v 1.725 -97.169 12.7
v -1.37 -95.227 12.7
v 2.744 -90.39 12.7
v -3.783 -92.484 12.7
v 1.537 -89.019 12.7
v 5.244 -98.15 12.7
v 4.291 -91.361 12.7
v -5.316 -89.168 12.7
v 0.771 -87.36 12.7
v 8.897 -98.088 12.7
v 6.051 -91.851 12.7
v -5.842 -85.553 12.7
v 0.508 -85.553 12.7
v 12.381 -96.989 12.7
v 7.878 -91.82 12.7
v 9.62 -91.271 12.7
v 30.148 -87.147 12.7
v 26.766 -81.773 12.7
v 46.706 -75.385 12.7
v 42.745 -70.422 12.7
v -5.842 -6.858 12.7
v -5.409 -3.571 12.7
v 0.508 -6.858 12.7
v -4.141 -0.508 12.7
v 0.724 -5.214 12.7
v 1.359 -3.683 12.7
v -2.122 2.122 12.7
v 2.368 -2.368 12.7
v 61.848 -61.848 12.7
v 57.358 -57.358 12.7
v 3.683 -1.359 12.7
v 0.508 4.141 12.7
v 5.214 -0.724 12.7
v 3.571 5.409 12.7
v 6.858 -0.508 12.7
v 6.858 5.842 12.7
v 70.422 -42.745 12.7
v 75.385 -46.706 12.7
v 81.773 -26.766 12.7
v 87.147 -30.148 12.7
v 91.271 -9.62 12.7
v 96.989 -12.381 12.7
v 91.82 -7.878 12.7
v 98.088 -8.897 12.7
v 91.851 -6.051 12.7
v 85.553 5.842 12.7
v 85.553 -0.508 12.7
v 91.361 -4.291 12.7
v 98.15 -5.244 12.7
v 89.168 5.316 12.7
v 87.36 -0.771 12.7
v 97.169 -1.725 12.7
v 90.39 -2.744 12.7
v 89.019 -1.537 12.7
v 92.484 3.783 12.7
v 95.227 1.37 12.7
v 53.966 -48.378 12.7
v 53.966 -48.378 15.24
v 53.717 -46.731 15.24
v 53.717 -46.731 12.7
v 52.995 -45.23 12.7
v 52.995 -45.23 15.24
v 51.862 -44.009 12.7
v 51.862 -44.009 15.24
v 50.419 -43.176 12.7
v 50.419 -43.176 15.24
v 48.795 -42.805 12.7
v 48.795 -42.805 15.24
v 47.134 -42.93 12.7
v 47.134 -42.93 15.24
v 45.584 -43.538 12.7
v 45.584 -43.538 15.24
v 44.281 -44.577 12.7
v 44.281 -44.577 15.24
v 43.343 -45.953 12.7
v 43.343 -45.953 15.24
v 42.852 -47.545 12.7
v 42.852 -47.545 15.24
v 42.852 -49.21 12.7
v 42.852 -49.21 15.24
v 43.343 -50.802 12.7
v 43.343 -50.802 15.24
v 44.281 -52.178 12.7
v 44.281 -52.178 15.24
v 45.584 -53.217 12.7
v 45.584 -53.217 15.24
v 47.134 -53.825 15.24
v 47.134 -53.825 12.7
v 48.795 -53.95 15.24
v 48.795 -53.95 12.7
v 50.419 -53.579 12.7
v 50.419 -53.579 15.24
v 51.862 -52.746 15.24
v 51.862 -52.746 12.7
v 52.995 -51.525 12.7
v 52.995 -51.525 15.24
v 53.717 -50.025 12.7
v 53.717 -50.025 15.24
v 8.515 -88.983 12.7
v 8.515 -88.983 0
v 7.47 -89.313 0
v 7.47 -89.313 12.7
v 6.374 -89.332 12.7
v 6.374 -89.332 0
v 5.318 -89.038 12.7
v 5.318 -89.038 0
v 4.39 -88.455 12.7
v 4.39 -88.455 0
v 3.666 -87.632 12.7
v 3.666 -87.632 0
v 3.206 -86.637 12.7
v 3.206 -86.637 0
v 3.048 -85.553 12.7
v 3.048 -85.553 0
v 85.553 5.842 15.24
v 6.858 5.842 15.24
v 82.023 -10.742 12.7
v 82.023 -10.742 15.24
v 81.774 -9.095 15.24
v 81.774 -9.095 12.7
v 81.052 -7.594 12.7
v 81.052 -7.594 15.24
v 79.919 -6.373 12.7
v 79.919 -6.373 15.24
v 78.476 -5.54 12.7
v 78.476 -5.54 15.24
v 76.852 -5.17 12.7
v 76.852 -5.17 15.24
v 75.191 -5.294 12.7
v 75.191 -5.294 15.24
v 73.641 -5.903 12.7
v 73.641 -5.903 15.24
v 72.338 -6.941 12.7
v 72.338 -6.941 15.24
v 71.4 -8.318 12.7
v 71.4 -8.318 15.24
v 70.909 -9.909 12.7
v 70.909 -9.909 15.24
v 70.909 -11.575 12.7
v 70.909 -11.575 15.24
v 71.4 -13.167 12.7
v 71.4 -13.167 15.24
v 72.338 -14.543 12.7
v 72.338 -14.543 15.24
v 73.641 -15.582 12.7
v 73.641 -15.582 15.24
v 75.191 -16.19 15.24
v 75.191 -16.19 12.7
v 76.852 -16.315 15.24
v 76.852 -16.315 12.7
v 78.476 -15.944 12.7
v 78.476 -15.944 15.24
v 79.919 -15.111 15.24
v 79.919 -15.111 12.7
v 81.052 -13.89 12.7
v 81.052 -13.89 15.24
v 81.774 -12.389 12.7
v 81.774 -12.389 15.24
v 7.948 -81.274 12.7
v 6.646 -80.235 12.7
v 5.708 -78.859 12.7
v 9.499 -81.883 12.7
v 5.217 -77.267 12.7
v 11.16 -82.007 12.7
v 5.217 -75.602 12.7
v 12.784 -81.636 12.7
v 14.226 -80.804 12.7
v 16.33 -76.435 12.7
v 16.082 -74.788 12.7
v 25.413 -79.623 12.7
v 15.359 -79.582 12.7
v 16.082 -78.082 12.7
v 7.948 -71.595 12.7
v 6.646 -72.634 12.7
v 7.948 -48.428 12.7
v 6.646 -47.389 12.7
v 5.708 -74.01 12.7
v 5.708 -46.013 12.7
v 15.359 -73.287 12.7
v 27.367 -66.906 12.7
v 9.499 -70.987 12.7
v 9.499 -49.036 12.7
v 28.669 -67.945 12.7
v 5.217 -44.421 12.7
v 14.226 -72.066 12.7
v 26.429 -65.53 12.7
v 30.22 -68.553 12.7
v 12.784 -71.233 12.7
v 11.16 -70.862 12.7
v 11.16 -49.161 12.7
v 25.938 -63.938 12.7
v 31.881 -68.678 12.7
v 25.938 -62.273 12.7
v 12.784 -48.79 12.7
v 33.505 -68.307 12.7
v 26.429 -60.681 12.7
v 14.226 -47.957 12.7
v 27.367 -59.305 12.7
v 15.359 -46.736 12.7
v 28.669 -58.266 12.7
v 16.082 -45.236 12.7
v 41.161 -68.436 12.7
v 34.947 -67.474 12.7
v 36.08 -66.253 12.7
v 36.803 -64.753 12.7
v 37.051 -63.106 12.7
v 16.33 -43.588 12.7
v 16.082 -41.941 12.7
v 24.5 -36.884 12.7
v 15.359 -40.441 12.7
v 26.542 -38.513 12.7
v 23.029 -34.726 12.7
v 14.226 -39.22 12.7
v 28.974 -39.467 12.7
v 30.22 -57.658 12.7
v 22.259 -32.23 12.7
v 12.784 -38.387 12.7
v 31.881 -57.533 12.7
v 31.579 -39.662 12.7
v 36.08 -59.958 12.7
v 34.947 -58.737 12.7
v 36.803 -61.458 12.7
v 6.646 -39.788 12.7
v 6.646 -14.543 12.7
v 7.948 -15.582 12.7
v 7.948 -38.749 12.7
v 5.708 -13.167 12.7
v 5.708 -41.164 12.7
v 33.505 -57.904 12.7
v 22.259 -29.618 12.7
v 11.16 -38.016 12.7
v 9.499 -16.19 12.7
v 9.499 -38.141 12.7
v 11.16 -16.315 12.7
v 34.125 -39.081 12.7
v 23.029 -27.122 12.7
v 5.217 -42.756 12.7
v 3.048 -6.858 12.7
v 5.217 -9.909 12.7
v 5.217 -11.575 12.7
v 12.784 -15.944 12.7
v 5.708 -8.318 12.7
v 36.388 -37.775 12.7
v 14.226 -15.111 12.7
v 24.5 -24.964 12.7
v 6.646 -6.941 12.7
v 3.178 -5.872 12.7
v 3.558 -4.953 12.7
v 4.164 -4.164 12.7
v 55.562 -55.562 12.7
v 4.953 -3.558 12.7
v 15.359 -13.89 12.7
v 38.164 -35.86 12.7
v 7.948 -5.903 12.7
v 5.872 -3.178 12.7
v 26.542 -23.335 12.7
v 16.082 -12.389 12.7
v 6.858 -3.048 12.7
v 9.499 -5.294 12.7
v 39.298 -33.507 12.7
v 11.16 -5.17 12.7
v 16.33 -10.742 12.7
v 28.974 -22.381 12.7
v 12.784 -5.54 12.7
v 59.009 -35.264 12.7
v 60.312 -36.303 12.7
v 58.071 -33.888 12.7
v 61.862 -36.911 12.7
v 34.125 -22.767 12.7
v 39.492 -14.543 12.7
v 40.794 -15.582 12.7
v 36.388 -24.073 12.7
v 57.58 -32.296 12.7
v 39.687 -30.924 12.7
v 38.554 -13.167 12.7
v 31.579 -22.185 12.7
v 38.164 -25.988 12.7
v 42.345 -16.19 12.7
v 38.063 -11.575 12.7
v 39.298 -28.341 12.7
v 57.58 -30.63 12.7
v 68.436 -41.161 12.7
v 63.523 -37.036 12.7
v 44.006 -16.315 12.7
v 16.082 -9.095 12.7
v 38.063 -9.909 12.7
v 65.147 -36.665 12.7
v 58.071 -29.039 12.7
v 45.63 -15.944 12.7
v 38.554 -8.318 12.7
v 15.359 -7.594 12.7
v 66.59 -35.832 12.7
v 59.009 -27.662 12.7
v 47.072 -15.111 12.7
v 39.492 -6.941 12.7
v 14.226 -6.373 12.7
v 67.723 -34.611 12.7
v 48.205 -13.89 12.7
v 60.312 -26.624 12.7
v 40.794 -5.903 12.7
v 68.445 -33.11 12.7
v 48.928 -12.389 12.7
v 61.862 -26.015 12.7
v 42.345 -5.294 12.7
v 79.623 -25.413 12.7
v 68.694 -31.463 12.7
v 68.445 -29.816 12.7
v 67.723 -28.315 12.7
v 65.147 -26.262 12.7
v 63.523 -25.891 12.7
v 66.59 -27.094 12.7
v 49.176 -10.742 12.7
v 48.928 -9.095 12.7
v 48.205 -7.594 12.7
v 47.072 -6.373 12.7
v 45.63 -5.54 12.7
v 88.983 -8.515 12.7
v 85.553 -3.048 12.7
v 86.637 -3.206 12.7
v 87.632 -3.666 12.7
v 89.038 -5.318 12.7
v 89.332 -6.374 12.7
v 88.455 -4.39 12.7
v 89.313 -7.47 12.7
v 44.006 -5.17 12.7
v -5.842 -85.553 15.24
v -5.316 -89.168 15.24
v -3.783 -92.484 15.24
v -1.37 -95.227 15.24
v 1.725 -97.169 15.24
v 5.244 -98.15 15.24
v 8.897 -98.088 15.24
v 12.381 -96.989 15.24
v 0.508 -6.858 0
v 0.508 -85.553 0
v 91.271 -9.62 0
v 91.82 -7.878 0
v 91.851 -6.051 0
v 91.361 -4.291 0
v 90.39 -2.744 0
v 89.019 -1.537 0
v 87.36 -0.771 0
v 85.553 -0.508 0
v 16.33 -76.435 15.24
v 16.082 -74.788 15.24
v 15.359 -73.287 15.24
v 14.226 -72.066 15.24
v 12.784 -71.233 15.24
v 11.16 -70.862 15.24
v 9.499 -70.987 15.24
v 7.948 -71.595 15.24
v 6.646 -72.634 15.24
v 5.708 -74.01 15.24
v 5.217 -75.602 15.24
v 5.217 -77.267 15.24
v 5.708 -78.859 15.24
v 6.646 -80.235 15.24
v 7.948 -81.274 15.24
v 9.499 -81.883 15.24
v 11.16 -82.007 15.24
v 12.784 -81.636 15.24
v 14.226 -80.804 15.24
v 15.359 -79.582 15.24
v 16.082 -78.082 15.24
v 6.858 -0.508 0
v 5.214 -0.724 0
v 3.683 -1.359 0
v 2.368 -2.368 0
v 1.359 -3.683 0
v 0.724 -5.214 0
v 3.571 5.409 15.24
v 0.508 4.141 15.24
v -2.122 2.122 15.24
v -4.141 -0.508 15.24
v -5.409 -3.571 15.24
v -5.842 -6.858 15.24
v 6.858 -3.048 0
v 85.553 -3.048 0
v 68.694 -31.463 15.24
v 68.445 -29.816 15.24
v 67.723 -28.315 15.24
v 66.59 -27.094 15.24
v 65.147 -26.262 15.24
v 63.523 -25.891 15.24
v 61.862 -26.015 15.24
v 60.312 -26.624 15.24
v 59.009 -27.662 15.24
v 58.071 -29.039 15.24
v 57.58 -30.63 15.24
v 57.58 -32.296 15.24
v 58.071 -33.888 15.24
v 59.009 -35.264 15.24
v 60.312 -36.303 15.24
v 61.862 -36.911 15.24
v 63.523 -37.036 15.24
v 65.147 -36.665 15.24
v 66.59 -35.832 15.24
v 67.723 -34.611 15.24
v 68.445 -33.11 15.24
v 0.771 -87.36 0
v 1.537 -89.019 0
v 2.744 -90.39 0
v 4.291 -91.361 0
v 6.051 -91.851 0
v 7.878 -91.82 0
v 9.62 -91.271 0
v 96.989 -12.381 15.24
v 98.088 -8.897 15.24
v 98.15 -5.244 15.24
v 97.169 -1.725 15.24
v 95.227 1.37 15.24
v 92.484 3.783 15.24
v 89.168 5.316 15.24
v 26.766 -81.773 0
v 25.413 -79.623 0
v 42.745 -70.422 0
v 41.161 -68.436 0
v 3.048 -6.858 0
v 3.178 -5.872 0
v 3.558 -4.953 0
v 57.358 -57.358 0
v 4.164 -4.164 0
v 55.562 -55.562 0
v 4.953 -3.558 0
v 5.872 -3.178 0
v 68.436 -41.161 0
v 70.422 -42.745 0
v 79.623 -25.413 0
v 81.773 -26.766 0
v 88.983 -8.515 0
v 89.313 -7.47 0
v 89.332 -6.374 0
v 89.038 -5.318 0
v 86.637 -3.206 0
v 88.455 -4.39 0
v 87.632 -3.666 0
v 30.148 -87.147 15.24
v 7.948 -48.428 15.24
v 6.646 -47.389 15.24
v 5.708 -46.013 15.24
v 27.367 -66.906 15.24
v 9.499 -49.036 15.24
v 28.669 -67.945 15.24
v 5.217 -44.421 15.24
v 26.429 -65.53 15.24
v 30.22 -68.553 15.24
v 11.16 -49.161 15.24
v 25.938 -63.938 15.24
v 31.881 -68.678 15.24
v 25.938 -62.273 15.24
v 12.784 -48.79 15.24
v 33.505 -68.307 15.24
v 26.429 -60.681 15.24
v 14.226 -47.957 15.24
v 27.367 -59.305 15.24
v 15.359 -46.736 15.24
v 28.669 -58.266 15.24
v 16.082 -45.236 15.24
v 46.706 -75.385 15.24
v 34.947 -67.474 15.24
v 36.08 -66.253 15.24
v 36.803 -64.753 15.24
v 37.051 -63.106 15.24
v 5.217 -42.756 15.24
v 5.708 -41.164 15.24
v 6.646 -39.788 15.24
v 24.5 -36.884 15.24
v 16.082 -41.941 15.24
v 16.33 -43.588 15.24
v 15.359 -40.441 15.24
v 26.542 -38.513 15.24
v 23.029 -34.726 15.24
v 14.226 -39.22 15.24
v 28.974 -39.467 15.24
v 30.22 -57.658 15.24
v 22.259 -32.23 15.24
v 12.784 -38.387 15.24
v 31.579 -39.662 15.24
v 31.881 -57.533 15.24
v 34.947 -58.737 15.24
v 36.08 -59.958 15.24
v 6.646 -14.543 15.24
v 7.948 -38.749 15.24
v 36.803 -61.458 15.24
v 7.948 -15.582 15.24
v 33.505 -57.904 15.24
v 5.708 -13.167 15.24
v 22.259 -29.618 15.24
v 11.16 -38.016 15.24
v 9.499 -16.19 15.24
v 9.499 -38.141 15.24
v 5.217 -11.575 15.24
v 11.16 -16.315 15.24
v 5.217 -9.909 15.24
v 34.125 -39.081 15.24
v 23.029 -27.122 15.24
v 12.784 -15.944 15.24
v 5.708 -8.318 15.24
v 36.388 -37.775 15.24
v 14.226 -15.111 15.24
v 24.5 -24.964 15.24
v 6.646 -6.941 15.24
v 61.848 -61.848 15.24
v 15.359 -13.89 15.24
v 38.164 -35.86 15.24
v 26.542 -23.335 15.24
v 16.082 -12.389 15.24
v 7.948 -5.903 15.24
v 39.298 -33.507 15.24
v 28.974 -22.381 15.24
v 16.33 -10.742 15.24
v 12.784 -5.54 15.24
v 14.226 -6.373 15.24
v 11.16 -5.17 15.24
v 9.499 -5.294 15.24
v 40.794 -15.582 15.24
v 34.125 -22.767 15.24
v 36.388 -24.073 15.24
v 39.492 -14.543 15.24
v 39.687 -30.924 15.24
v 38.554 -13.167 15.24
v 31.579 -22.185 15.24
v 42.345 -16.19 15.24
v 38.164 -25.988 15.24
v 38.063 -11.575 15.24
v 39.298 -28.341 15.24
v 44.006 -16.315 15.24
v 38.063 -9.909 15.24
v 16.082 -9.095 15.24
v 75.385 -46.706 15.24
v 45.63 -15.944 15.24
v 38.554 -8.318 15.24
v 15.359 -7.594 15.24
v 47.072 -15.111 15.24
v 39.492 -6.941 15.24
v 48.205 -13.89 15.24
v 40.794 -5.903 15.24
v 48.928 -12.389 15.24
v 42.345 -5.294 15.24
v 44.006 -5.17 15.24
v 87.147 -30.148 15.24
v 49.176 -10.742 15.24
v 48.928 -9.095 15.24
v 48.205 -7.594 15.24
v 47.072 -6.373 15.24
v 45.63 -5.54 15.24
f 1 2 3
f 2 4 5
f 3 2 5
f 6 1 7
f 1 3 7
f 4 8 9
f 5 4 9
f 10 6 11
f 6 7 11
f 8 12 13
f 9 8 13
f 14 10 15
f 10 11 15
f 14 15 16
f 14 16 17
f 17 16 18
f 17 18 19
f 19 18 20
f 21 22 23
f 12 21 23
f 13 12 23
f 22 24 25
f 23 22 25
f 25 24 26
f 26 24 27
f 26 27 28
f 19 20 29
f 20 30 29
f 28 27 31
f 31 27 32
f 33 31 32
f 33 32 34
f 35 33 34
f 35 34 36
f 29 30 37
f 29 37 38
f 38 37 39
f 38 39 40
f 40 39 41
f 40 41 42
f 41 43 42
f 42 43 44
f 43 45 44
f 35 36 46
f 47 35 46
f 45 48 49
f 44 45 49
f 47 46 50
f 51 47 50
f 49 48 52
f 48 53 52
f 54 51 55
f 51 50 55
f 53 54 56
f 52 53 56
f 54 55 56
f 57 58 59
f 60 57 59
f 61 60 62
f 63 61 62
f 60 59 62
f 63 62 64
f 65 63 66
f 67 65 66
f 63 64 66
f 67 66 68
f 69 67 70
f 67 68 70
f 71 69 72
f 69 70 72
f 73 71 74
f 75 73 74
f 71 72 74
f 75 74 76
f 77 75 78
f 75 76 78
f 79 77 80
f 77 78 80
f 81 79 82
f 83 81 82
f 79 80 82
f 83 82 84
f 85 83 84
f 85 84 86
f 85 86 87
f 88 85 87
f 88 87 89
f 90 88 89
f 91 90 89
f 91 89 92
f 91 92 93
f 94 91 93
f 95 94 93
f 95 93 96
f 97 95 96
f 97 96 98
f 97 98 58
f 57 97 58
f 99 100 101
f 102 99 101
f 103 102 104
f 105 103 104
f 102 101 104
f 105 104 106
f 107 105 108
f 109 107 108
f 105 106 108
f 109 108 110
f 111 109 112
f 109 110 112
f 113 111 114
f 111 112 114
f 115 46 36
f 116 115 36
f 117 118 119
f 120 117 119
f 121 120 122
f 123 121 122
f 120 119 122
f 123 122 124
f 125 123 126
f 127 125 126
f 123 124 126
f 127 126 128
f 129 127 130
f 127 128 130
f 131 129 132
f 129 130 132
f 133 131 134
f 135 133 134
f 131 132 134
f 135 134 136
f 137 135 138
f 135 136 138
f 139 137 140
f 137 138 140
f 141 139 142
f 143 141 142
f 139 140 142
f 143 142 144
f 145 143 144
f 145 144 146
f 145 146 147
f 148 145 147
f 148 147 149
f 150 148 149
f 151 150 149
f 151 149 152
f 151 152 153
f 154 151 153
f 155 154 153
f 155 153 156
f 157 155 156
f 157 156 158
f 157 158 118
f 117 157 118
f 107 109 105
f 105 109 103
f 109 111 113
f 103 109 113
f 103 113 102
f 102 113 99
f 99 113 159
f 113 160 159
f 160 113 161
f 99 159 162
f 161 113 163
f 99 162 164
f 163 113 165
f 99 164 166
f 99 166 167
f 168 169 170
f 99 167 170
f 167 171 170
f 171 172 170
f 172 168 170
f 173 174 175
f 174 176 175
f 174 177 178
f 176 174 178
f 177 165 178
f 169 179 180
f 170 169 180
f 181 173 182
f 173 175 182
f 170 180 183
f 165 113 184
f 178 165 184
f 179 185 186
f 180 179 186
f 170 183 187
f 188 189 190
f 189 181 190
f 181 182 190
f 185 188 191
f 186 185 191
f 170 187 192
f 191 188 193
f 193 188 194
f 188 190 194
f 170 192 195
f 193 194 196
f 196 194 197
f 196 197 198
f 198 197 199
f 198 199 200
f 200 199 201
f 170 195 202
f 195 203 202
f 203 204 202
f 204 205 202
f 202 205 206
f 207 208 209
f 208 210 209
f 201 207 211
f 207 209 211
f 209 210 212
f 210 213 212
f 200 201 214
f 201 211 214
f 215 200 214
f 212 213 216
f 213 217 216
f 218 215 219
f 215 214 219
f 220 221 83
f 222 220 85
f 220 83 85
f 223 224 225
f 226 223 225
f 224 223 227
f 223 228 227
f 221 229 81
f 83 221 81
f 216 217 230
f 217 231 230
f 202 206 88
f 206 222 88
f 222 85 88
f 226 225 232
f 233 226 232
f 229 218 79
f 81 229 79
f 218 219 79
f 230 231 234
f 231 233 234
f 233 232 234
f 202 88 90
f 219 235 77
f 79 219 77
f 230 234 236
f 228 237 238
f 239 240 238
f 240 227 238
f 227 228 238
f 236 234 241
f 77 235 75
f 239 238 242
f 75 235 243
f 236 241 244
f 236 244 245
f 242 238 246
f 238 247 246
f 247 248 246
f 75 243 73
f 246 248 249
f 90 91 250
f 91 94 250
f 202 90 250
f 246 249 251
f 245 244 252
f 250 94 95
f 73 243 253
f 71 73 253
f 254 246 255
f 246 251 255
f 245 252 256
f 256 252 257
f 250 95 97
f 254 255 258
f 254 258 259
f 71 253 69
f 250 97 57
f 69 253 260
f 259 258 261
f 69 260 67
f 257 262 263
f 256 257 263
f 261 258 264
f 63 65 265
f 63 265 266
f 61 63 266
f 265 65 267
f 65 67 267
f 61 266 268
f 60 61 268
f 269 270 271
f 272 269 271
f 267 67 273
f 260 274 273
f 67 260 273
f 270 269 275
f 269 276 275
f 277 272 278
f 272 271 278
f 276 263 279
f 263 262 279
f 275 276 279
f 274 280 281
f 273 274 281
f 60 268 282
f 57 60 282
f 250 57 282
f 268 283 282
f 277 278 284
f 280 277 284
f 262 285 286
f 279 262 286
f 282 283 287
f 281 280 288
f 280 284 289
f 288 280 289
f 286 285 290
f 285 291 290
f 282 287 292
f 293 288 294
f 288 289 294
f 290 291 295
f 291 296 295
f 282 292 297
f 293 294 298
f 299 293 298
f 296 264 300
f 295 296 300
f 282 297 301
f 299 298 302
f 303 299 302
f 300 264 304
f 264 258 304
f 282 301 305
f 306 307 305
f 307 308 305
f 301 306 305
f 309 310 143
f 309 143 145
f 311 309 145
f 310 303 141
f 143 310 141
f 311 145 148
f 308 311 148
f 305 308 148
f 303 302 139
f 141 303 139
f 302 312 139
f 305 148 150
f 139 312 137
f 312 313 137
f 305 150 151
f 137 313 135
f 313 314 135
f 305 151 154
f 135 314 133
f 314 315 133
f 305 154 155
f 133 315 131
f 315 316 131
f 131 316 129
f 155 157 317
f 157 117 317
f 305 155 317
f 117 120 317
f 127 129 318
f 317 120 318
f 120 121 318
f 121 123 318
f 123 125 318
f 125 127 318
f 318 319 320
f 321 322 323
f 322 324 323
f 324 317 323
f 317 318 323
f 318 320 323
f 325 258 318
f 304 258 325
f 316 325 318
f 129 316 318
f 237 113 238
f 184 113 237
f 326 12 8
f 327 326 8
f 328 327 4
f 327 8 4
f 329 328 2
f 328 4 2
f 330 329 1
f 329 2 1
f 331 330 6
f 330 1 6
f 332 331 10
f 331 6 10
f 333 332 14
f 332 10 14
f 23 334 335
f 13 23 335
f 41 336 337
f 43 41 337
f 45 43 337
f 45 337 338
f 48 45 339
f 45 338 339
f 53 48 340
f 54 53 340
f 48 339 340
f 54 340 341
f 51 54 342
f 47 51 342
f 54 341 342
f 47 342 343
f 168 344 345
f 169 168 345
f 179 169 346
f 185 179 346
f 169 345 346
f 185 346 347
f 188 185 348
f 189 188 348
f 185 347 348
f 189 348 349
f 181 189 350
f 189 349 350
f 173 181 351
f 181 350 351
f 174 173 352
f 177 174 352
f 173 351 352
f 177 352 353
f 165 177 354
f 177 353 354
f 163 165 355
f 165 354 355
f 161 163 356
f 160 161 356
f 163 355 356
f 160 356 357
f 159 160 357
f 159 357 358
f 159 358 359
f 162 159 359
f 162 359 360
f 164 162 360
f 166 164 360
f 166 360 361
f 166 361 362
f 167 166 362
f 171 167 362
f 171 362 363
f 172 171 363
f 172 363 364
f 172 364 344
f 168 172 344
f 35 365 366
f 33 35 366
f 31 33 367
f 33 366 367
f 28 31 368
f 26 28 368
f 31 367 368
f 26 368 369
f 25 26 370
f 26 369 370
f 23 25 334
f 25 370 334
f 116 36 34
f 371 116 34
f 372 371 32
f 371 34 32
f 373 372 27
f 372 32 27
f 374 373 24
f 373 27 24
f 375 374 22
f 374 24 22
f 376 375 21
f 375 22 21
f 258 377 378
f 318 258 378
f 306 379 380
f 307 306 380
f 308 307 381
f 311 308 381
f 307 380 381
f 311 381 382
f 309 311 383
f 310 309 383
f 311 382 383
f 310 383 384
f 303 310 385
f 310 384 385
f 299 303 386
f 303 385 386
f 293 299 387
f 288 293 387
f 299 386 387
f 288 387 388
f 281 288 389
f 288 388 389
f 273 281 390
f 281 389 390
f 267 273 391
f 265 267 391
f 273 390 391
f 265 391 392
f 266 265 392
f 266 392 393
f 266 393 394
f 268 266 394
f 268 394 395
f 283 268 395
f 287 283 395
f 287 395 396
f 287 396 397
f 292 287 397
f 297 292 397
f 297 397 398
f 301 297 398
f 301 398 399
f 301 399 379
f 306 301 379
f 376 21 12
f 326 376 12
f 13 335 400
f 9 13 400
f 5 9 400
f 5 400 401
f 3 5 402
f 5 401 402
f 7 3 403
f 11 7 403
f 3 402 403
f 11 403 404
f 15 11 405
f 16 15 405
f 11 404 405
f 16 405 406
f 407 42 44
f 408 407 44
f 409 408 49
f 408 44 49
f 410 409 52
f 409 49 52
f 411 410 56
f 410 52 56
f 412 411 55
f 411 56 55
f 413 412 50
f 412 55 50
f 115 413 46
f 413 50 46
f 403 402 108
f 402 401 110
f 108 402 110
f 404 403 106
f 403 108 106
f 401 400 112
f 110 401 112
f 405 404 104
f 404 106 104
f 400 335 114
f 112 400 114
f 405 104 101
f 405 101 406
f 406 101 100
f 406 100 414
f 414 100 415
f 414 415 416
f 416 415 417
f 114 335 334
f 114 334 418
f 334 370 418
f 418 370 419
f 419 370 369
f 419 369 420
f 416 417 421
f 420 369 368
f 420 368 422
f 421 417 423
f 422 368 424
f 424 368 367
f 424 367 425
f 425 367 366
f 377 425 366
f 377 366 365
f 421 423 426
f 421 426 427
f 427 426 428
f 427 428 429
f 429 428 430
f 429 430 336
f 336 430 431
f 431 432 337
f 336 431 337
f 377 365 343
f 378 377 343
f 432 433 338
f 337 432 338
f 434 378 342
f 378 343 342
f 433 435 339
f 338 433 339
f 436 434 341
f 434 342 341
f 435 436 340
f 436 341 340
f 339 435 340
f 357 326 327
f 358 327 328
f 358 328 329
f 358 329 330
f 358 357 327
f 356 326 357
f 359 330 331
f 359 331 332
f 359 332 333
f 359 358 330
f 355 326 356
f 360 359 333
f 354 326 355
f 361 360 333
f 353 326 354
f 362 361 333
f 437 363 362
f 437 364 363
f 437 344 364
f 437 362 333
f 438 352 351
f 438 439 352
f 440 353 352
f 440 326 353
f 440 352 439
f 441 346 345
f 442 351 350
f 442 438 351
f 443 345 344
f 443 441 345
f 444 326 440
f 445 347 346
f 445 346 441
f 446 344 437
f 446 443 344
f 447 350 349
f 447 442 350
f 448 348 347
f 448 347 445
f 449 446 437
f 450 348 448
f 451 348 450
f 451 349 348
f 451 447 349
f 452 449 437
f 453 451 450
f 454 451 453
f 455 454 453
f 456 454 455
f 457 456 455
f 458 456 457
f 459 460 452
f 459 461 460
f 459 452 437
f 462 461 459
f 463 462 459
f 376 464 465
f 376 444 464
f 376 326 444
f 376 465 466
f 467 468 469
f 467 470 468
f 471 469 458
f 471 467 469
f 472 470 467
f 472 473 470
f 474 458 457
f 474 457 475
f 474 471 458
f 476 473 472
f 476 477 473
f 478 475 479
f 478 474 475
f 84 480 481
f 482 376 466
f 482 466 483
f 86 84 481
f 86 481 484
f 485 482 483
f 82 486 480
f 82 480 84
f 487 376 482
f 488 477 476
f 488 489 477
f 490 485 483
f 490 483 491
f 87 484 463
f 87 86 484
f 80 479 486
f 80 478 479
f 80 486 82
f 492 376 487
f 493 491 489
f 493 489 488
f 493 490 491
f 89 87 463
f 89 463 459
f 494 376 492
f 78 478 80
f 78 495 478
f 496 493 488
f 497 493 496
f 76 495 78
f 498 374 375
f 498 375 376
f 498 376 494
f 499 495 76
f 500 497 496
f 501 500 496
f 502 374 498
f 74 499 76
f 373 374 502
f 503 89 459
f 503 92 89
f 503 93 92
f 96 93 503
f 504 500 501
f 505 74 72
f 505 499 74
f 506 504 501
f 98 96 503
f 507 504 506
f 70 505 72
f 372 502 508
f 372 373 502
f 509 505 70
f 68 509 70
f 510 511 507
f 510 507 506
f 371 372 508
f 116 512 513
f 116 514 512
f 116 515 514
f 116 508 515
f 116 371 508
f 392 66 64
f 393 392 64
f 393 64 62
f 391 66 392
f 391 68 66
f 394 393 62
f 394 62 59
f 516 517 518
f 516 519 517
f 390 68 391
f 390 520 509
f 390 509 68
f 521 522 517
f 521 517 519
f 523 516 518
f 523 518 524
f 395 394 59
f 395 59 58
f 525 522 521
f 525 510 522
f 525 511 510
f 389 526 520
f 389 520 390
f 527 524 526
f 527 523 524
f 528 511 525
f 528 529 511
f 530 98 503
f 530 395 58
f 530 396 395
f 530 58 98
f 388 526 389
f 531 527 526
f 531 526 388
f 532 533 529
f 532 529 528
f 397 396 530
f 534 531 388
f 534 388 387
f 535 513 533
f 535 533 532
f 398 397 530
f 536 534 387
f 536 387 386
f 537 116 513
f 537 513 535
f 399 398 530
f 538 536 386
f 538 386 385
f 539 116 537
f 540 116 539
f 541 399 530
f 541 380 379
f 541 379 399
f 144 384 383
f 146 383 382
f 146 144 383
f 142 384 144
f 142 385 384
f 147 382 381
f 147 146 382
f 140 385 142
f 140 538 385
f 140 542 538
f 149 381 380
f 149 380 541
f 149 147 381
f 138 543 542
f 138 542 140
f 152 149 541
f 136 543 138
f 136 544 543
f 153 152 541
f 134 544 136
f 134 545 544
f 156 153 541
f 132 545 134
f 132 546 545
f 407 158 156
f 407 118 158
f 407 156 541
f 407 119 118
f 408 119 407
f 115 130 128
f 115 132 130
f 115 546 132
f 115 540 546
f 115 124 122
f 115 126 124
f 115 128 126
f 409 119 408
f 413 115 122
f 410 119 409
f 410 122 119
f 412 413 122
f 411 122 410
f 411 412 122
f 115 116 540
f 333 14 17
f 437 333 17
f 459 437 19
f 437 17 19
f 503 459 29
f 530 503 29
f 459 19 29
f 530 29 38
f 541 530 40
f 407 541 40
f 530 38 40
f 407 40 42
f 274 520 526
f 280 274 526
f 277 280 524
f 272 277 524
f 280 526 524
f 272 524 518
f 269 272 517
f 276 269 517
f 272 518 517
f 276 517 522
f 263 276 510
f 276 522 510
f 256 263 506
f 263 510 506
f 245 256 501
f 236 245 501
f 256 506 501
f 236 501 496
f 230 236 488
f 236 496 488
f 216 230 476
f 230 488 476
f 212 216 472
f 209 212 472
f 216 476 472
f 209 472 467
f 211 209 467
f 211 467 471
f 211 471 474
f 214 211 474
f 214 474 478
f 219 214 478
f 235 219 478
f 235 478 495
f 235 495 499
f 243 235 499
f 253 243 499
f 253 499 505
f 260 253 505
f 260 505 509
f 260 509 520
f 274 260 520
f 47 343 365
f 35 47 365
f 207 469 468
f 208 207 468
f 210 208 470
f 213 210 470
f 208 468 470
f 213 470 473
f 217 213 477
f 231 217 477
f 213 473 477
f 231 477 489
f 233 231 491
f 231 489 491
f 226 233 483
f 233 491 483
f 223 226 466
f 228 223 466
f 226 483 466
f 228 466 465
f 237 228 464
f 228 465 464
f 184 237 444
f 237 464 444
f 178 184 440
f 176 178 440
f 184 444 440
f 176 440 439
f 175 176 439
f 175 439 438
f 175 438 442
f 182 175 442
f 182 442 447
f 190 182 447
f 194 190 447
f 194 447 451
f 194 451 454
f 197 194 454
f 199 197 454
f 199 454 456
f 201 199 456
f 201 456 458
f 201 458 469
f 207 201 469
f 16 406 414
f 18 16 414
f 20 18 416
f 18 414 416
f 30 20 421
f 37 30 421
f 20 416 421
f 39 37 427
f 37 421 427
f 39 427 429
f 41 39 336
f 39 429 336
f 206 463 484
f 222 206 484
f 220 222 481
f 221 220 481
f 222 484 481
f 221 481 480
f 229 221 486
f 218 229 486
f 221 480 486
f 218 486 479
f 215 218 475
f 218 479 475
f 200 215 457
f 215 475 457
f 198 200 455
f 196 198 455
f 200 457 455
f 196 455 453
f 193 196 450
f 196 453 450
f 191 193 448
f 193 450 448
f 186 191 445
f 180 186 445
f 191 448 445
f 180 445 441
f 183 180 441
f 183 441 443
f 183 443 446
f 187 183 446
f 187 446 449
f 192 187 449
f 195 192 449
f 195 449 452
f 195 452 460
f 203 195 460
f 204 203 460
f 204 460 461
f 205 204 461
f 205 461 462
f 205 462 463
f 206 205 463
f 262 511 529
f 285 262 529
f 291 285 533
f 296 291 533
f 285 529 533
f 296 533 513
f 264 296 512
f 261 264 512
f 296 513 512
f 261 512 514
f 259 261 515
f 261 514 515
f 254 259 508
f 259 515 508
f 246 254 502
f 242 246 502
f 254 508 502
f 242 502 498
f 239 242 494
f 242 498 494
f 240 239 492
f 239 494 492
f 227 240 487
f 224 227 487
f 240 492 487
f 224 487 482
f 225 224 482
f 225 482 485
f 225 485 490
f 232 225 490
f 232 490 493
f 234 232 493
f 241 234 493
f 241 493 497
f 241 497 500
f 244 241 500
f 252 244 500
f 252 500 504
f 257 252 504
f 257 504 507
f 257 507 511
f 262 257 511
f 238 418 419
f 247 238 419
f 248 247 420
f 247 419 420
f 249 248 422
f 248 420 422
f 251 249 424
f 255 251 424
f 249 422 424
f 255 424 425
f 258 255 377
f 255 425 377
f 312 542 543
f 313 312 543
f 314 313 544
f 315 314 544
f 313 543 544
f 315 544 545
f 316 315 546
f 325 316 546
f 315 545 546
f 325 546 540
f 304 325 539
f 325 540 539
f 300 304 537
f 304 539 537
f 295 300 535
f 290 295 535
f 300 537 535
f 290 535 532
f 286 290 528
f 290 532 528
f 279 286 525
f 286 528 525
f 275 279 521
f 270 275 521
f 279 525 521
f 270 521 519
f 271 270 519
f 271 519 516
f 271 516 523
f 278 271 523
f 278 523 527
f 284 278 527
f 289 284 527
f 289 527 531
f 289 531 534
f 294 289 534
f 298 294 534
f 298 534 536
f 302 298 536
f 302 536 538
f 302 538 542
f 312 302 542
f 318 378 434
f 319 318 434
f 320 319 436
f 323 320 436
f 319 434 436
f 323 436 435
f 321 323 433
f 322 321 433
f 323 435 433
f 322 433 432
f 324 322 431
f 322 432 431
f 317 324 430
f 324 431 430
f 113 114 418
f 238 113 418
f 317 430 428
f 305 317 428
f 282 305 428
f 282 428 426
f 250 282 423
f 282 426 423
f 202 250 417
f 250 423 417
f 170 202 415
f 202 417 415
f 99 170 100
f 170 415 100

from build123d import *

# Parameters (mm, degrees)
F1_DEPTH = 12.7
F3_DEPTH = 2.54
F4_R     = 5.588
F4_R_2   = 8.763
F5_DEPTH = 25.4


with BuildPart() as f1:
    # F0 (on Top) → F1 (new body)
    with BuildSketch(Plane.XY):
        with BuildLine():
            ThreePointArc((0.508, -85.5526443698), (3.4826484531, -90.931259613), (9.6196541528, -91.2706655607))
            ThreePointArc((9.6196541528, -91.2706655607), (57.3578547677, -57.3578547677), (91.2706655607, -9.6196541528))
            ThreePointArc((91.2706655607, -9.6196541528), (90.931259613, -3.4826484531), (85.5526443698, -0.508))
            Line((85.5526443698, -0.508), (6.858, -0.508))
            ThreePointArc((6.858, -0.508), (2.3678719395, -2.3678719395), (0.508, -6.858))
            Line((0.508, -6.858), (0.508, -85.5526443698))
        make_face()
        with BuildLine():
            ThreePointArc((88.9834570843, -8.5149924917), (55.5618035435, -55.5618035435), (8.5149924917, -88.9834570843))
            ThreePointArc((8.5149924917, -88.9834570843), (4.8327890719, -88.7798135157), (3.048, -85.5526443698))
            Line((3.048, -85.5526443698), (3.048, -6.858))
            ThreePointArc((3.048, -6.858), (4.1639231637, -4.1639231637), (6.858, -3.048))
            Line((6.858, -3.048), (85.5526443698, -3.048))
            ThreePointArc((85.5526443698, -3.048), (88.7798135157, -4.8327890719), (88.9834570843, -8.5149924917))
        make_face(mode=Mode.SUBTRACT)
    extrude(amount=F1_DEPTH)

    # F2 (on face) → F3 (join)
    with BuildSketch(Plane.XY.offset(12.7)):
        with BuildLine():
            Line((85.5526443698, 5.842), (6.858, 5.842))
            ThreePointArc((6.858, 5.842), (-2.1222561211, 2.1222561211), (-5.842, -6.858))
            Line((-5.842, -6.858), (-5.842, -85.5526443698))
            ThreePointArc((-5.842, -85.5526443698), (0.1072969063, -96.3098748563), (12.3813083055, -96.9886867517))
            ThreePointArc((12.3813083055, -96.9886867517), (61.8479828282, -61.8479828282), (96.9886867517, -12.3813083055))
            ThreePointArc((96.9886867517, -12.3813083055), (96.3098748563, -0.1072969063), (85.5526443698, 5.842))
        make_face()
        with BuildLine():
            ThreePointArc((9.6196541528, -91.2706655607), (3.4826484531, -90.931259613), (0.508, -85.5526443698))
            Line((0.508, -85.5526443698), (0.508, -6.858))
            ThreePointArc((0.508, -6.858), (2.3678719395, -2.3678719395), (6.858, -0.508))
            Line((6.858, -0.508), (85.5526443698, -0.508))
            ThreePointArc((85.5526443698, -0.508), (90.931259613, -3.4826484531), (91.2706655607, -9.6196541528))
            ThreePointArc((91.2706655607, -9.6196541528), (57.3578547677, -57.3578547677), (9.6196541528, -91.2706655607))
        make_face(mode=Mode.SUBTRACT)
        with BuildLine():
            Line((0.508, -6.858), (0.508, -85.5526443698))
            ThreePointArc((0.508, -85.5526443698), (3.4826484531, -90.931259613), (9.6196541528, -91.2706655607))
            ThreePointArc((9.6196541528, -91.2706655607), (57.3578547677, -57.3578547677), (91.2706655607, -9.6196541528))
            ThreePointArc((91.2706655607, -9.6196541528), (90.931259613, -3.4826484531), (85.5526443698, -0.508))
            Line((85.5526443698, -0.508), (6.858, -0.508))
            ThreePointArc((6.858, -0.508), (2.3678719395, -2.3678719395), (0.508, -6.858))
        make_face()
        with BuildLine():
            ThreePointArc((85.5526443698, -3.048), (88.7798135157, -4.8327890719), (88.9834570843, -8.5149924917))
            ThreePointArc((88.9834570843, -8.5149924917), (55.5618035435, -55.5618035435), (8.5149924917, -88.9834570843))
            ThreePointArc((8.5149924917, -88.9834570843), (4.8327890719, -88.7798135157), (3.048, -85.5526443698))
            Line((3.048, -85.5526443698), (3.048, -6.858))
            ThreePointArc((3.048, -6.858), (4.1639231637, -4.1639231637), (6.858, -3.048))
            Line((6.858, -3.048), (85.5526443698, -3.048))
        make_face(mode=Mode.SUBTRACT)
        with BuildLine():
            ThreePointArc((8.5149924917, -88.9834570843), (55.5618035435, -55.5618035435), (88.9834570843, -8.5149924917))
            ThreePointArc((88.9834570843, -8.5149924917), (88.7798135157, -4.8327890719), (85.5526443698, -3.048))
            Line((85.5526443698, -3.048), (6.858, -3.048))
            ThreePointArc((6.858, -3.048), (4.1639231637, -4.1639231637), (3.048, -6.858))
            Line((3.048, -6.858), (3.048, -85.5526443698))
            ThreePointArc((3.048, -85.5526443698), (4.8327890719, -88.7798135157), (8.5149924917, -88.9834570843))
        make_face()
    extrude(amount=F3_DEPTH)

    # F4 (on face) → F5 (cut)
    with BuildSketch(Plane.XY.offset(15.24)):
        with Locations((10.7421888637, -10.7421888637)):
            Circle(F4_R)
        with Locations((30.9239914141, -30.9239914141)):
            Circle(F4_R_2)
        with Locations((43.5884171282, -10.7421888637)):
            Circle(F4_R)
        with Locations((10.7421888637, -43.5884171282)):
            Circle(F4_R)
        with Locations((10.7421888637, -76.4346453927)):
            Circle(F4_R)
        with Locations((31.4632623863, -63.1055415565)):
            Circle(F4_R)
        with Locations((48.3775986466, -48.3775986466)):
            Circle(F4_R)
        with Locations((63.1055415565, -31.4632623863)):
            Circle(F4_R)
        with Locations((76.4346453927, -10.7421888637)):
            Circle(F4_R)
    extrude(amount=-F5_DEPTH, mode=Mode.SUBTRACT)


solid = f1.part
